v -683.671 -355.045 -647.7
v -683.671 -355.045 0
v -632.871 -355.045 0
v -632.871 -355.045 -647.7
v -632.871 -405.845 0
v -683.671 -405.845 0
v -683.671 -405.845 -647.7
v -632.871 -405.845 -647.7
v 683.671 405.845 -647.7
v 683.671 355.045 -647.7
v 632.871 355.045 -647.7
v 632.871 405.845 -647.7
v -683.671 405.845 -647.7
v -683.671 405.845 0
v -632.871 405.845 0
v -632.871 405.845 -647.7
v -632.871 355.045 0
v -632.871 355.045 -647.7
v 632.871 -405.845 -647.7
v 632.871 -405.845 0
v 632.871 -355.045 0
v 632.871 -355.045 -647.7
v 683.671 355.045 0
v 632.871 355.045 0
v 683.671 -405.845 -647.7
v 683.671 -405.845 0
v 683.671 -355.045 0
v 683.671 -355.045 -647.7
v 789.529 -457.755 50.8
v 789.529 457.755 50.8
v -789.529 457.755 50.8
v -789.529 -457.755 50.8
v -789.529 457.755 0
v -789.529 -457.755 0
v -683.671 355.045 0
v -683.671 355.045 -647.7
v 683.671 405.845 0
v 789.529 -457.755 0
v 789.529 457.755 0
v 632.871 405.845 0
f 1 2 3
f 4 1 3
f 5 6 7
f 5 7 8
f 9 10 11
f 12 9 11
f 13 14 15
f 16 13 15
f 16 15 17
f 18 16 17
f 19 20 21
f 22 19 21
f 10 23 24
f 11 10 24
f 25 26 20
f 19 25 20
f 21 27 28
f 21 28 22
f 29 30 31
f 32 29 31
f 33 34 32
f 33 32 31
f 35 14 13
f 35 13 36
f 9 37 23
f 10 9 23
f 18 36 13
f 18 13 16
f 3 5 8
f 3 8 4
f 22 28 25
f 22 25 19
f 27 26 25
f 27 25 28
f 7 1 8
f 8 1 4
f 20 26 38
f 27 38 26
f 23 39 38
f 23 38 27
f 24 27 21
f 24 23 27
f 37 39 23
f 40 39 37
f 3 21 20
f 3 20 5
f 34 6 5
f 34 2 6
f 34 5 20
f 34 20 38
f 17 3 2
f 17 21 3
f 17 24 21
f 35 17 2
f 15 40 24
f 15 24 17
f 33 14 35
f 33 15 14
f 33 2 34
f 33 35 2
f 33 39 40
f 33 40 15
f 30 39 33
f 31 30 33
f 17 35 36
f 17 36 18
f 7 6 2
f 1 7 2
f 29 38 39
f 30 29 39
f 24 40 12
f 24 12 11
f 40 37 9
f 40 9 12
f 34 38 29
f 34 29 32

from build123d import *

# Parameters (mm, degrees)
F0_W     = 1524
F0_H     = 914.4
F1_DEPTH = 50.8
F2_W     = 50.8
F2_H     = 50.8
F3_DEPTH = 698.5


with BuildPart() as f1:
    # F0 (on Top) → F1 (new body)
    with BuildSketch(Plane.XY):
        with Locations((27.529123, 0.555292)):
            Rectangle(F0_W, F0_H)
    extrude(amount=F1_DEPTH)

    # F2 (on face) → F3 (join)
    with BuildSketch(Plane.XY.offset(50.8)):
        with Locations((-658.270877, -380.444708)):
            Rectangle(F2_W, F2_H)
    extrude(amount=-F3_DEPTH)

    # F4: F1 across plane


with BuildPart() as f1_1:
    add(f1.part)
    add(f1.part.mirror(Plane.XZ))

    # F5: F1 across plane


with BuildPart() as f1_2:
    add(f1_1.part)
    add(f1_1.part.mirror(Plane.YZ))


solid = f1_2.part
